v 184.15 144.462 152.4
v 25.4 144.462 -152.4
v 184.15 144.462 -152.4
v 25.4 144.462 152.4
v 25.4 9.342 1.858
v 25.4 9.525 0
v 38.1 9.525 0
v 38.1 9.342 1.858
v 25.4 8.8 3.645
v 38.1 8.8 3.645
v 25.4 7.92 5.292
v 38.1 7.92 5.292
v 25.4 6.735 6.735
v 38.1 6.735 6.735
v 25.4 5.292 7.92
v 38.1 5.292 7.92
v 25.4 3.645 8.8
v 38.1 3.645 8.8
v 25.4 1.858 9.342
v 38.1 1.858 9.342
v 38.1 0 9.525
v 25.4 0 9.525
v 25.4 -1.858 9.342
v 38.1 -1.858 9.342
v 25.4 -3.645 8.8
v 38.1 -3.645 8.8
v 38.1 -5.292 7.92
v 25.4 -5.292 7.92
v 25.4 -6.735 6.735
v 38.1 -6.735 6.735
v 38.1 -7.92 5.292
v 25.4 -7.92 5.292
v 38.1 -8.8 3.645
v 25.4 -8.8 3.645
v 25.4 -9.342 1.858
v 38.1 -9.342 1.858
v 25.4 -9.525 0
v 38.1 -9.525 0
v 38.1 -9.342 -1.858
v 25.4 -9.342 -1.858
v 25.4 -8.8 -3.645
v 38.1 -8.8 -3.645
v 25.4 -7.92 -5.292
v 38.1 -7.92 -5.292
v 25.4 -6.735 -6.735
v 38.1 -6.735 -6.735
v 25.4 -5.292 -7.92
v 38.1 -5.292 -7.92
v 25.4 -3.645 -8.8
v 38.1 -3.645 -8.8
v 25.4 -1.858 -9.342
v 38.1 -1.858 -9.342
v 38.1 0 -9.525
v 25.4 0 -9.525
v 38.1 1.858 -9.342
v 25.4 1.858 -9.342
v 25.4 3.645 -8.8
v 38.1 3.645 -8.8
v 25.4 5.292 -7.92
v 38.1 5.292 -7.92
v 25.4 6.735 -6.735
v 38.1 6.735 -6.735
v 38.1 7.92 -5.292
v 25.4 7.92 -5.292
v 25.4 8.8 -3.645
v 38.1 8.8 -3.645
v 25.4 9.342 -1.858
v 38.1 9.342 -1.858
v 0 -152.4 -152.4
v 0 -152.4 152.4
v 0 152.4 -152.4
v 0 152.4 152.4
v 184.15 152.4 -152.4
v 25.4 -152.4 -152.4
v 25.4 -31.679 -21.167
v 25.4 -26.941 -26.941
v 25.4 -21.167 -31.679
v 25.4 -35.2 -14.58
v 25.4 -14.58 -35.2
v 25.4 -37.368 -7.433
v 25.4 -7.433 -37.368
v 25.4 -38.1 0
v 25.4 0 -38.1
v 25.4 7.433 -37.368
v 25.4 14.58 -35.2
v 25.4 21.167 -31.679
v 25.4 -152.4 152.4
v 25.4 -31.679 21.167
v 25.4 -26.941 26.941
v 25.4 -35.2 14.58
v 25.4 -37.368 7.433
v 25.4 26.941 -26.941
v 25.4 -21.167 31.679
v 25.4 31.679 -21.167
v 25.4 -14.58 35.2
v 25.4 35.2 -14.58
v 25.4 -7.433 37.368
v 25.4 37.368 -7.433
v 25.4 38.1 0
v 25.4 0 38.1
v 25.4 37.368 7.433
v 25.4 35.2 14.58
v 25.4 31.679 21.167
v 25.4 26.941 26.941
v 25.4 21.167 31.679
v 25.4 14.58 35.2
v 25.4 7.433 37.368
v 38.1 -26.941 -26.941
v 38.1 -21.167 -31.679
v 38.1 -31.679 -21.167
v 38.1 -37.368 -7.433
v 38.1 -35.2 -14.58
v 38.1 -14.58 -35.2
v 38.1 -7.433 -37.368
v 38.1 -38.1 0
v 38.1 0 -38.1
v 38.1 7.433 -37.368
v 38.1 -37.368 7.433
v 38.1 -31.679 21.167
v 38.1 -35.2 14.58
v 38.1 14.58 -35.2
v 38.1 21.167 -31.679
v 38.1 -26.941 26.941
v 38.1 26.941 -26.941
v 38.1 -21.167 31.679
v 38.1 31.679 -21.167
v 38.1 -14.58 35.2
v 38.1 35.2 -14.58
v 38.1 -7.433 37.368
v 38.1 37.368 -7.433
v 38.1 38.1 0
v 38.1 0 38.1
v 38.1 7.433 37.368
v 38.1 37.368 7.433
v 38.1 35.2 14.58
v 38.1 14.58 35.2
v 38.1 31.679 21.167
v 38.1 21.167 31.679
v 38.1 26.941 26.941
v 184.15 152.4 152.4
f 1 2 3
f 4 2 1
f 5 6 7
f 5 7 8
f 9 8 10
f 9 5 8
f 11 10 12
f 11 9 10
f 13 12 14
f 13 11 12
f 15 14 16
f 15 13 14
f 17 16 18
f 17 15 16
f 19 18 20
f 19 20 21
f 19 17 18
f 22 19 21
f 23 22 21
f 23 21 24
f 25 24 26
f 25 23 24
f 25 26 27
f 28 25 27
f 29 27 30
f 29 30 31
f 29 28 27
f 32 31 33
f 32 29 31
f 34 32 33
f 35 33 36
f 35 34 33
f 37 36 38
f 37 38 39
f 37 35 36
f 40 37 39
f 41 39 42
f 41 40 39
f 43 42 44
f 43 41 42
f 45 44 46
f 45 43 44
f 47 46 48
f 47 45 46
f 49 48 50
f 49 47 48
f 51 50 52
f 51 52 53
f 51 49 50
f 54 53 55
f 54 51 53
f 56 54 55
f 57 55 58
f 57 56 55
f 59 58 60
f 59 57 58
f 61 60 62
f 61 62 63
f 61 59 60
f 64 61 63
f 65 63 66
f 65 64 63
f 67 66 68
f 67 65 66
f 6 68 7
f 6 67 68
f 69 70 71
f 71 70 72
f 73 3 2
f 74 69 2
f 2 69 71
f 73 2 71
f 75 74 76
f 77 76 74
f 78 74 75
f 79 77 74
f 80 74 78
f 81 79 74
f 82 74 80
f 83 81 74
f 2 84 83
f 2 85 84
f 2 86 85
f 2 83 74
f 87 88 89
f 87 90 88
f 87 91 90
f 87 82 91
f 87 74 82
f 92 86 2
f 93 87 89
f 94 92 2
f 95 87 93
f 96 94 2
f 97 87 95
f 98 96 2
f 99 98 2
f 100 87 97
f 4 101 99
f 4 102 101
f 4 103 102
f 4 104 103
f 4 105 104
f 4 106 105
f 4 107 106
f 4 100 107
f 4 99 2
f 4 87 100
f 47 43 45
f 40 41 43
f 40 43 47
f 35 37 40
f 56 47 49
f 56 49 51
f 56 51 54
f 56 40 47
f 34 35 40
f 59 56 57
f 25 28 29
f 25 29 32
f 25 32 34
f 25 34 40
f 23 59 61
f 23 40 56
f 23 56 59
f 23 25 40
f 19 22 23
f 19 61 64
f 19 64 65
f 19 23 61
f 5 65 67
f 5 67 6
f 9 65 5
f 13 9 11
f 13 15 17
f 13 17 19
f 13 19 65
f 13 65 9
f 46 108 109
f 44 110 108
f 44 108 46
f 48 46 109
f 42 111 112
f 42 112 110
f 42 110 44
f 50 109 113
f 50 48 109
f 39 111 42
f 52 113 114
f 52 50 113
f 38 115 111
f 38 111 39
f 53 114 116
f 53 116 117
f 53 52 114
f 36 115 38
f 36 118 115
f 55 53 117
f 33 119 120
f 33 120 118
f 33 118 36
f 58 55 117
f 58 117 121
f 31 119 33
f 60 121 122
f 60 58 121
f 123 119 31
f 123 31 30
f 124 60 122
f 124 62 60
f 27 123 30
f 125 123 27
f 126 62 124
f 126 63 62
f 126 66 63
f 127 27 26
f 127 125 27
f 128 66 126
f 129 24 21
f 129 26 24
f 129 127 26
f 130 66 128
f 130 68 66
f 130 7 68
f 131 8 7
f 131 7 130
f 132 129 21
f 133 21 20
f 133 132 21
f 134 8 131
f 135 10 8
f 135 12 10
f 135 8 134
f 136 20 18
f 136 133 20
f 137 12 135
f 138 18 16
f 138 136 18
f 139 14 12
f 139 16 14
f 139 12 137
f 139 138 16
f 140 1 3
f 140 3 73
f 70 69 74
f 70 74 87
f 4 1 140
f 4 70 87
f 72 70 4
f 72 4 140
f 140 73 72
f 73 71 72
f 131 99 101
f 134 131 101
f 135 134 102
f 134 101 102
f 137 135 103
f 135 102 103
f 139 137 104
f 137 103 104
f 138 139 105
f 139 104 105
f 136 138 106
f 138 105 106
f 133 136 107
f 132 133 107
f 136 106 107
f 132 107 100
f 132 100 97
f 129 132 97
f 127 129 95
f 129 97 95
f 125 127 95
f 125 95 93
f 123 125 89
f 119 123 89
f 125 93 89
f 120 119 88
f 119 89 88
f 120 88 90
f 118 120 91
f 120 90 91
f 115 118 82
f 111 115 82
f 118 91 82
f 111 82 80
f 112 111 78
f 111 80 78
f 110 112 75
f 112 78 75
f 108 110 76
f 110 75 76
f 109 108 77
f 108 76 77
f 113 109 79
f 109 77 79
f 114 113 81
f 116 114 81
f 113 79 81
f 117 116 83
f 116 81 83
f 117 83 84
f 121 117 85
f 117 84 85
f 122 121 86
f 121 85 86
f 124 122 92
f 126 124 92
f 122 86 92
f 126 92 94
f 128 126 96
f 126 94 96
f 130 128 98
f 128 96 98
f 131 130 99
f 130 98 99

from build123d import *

# Parameters (mm, degrees)
F0_W     = 304.8
F0_H     = 304.8
F1_DEPTH = 25.4
F2_W     = 7.9375
F2_H     = 304.8
F3_DEPTH = 158.75
F4_R     = 38.1
F5_DEPTH = 12.7
F6_R     = 9.525
F7_DEPTH = 12.7


with BuildPart() as f1:
    # F0 (on Right) → F1 (new body)
    with BuildSketch(Plane.YZ):
        Rectangle(F0_W, F0_H)
    extrude(amount=F1_DEPTH)

    # F2 (on face) → F3 (join)
    with BuildSketch(Plane.YZ.offset(25.4)):
        with Locations((148.43125, 0)):
            Rectangle(F2_W, F2_H)
    extrude(amount=F3_DEPTH)

    # F4 (on face) → F5 (join)
    with BuildSketch(Plane.YZ.offset(25.4)):
        Circle(F4_R)
    extrude(amount=F5_DEPTH)

    # F6 (on face) → F7 (cut)
    with BuildSketch(Plane.YZ.offset(25.4)):
        Circle(F6_R)
    extrude(amount=F7_DEPTH, mode=Mode.SUBTRACT)


solid = f1.part
